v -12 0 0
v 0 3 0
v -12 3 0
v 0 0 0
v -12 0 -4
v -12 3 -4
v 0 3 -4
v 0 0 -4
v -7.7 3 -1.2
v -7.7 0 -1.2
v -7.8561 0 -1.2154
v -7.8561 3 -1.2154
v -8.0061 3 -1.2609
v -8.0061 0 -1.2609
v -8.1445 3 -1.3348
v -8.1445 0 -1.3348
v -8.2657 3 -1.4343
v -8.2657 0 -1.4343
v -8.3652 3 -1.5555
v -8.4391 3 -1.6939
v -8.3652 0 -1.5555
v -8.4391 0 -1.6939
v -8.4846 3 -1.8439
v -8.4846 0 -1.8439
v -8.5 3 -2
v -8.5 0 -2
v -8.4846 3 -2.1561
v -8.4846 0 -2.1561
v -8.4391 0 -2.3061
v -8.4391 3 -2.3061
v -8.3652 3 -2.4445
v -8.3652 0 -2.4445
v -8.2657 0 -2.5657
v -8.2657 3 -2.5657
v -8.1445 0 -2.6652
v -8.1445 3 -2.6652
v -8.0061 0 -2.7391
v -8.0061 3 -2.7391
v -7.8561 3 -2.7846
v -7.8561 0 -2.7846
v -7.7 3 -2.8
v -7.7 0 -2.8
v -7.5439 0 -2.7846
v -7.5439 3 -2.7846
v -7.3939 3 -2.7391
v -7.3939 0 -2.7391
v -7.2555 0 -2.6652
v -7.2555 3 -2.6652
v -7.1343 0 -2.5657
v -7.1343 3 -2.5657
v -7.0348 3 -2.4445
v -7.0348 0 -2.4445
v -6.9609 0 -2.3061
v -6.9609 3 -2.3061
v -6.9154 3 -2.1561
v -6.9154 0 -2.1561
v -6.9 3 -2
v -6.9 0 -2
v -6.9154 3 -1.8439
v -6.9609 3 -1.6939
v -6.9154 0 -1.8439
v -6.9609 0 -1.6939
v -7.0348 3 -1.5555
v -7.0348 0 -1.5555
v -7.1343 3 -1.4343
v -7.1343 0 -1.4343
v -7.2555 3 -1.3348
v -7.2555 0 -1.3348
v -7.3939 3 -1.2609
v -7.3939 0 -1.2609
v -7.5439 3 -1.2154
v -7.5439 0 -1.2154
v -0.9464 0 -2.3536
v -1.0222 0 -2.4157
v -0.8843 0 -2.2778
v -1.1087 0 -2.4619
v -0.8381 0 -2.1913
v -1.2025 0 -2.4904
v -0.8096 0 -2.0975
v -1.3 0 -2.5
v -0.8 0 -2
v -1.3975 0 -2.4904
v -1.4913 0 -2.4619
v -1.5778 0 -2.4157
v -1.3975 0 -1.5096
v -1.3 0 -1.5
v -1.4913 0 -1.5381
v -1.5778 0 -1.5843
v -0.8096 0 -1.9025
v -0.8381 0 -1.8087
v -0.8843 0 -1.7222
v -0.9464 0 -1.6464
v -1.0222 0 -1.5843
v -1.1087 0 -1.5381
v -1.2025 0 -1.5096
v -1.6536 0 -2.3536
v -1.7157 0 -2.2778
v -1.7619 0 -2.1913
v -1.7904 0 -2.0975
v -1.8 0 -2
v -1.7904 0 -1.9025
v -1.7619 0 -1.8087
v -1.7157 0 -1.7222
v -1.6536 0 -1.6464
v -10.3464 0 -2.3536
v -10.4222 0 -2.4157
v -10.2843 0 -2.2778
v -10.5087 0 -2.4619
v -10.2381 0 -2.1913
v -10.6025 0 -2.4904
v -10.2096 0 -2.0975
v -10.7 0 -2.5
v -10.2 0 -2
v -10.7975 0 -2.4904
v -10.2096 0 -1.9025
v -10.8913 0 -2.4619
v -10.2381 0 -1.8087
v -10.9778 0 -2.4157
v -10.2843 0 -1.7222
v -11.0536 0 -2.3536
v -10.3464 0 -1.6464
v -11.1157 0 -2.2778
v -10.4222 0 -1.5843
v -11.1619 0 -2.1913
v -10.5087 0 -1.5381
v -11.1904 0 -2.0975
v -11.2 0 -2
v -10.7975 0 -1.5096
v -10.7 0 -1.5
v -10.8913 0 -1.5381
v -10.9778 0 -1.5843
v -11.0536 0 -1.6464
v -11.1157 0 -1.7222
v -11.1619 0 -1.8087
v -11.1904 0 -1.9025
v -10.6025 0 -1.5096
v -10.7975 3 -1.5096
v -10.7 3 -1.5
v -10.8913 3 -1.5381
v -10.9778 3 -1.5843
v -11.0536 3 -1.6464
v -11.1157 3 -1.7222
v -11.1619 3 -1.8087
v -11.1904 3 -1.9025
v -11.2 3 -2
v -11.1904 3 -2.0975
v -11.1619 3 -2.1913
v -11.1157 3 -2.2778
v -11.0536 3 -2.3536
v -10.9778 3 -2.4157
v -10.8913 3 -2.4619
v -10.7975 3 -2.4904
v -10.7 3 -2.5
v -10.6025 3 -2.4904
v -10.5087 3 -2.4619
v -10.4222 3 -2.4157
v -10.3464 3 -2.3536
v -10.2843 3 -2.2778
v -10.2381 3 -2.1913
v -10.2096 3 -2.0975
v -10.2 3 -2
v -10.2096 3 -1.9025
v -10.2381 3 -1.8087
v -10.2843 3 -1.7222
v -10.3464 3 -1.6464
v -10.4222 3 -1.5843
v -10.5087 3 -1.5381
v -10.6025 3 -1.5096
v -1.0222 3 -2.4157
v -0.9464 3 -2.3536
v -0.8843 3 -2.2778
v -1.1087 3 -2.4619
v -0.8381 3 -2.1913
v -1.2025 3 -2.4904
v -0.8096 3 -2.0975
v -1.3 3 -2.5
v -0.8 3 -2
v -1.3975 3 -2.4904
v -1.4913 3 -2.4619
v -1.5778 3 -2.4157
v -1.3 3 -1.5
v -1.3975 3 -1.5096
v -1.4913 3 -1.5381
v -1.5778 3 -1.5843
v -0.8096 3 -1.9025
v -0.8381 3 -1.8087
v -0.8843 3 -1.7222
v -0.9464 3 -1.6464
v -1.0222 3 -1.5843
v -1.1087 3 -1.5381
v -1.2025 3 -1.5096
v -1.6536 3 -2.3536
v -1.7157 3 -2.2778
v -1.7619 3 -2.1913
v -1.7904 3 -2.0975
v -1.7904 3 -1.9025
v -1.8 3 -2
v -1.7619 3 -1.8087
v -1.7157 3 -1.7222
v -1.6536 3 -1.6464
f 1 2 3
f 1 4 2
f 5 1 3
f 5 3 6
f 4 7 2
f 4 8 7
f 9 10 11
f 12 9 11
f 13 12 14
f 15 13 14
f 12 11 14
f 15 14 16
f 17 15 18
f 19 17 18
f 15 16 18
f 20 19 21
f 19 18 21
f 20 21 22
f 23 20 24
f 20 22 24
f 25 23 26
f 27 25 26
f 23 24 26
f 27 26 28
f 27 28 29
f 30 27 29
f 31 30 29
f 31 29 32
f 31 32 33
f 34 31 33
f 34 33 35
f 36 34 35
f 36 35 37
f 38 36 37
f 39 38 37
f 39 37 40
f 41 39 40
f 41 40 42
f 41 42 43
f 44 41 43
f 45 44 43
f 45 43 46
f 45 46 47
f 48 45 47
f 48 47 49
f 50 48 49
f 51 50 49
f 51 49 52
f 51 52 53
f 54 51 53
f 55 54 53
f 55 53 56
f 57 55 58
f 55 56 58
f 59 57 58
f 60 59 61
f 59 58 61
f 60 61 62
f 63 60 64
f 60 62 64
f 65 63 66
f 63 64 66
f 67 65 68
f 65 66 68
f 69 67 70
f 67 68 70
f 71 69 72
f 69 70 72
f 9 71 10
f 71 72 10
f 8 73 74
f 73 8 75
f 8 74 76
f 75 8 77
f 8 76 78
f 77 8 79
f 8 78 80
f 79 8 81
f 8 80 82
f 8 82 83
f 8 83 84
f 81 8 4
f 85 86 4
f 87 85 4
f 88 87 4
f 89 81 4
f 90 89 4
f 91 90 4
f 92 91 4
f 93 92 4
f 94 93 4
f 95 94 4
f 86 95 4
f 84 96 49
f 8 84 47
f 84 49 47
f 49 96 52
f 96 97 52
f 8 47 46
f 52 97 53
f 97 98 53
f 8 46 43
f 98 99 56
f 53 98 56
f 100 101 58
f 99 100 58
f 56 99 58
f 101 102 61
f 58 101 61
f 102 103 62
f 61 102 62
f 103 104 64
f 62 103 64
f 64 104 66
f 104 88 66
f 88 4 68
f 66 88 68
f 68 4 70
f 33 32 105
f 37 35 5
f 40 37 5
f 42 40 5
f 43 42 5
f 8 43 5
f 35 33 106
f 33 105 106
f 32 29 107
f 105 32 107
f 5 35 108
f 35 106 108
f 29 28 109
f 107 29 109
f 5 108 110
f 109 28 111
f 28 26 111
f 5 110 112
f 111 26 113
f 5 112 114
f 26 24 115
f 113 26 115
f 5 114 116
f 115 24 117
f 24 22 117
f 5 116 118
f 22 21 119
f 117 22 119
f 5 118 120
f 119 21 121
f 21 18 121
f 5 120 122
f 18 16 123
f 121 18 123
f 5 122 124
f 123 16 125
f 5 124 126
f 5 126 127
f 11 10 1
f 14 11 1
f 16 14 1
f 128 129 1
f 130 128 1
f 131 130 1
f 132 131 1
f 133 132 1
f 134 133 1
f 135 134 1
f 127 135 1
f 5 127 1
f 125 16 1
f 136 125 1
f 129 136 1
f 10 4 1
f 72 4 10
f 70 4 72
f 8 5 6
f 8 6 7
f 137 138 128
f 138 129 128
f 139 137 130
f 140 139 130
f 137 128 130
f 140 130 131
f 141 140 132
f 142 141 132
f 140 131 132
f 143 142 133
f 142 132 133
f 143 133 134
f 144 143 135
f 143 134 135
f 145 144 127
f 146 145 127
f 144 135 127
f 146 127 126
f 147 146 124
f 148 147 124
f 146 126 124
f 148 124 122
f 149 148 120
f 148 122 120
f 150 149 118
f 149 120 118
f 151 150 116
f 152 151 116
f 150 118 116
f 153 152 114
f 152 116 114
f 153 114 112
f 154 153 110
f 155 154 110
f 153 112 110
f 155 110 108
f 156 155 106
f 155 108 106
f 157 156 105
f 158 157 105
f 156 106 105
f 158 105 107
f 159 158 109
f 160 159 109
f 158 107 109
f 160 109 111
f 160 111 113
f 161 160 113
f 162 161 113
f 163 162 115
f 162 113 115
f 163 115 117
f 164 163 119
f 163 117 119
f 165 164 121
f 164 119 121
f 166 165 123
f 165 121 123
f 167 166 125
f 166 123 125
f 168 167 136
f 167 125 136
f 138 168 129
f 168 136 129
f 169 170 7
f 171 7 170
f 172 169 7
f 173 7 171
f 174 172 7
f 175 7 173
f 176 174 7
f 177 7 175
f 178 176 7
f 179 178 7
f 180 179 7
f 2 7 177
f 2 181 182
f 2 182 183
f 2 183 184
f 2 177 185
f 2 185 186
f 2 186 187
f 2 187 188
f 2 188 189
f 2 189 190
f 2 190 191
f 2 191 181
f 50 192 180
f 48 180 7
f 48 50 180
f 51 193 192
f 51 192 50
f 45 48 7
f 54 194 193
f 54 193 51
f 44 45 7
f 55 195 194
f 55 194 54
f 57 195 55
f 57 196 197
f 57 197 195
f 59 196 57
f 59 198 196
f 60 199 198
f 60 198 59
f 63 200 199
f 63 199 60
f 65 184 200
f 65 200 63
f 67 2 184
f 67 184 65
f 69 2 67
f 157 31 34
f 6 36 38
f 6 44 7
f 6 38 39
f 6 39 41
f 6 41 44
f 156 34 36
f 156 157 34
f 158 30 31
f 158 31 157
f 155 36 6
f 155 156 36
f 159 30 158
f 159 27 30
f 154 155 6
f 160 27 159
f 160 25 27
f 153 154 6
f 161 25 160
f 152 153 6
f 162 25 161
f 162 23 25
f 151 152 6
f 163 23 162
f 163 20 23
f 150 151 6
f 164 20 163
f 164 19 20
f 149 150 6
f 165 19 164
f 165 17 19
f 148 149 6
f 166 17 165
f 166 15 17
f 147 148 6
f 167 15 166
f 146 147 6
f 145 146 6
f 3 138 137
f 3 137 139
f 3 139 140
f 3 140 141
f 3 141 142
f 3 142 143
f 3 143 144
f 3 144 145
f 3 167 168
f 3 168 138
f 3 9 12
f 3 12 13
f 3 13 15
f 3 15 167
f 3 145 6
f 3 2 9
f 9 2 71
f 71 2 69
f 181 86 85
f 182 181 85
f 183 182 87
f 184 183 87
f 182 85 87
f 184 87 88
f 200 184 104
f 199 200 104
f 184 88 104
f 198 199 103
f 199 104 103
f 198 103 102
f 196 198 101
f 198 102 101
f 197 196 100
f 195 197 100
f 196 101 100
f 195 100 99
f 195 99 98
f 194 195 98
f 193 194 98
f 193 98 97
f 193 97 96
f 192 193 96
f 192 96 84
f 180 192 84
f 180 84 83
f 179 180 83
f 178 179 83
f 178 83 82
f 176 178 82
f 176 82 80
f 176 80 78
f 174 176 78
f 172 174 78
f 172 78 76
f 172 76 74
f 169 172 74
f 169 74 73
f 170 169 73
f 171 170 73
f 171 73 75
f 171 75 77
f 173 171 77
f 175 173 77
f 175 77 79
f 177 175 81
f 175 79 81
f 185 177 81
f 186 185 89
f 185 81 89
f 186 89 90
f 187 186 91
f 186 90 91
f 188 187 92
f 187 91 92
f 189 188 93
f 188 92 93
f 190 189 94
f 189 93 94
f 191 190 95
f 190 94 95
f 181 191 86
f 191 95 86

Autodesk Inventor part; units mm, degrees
ref_plane "YZ Plane" through (0, 0, 0) normal (1, 0, 0) x (0, 1, 0)
ref_plane "XZ Plane" through (0, 0, 0) normal (0, 1, 0) x (-1, 0, 0)
ref_plane "XY Plane" through (0, 0, 0) normal (0, 0, 1) x (1, 0, 0)
sketch "스케치1" plane through (0, 0, 0) normal (0, 1, 0) x (-1, 0, 0)
  line L0 (0, 0) -> (12, 0)
  line L1 (12, 0) -> (12, -4)
  line L2 (12, -4) -> (0, -4)
  line L3 (0, -4) -> (0, 0)
  dimension "d0" = 12
  dimension "d1" = 4
extrude "돌출1" add sketch "스케치1" along normal blind 3
sketch "스케치2" plane through (0, 3, 0) normal (0, 1, 0) x (1, 0, 0)
  line L0 (0, 0) -> (0, 4) construction
  line L1 (0, 2) -> (-12, 2) construction
  line L2 (-12, 4) -> (-12, 0) construction
  point P0 (-1.3, 2)
  point P1 (-7.7, 2)
  point P2 (-10.7, 2)
  dimension "d59" = 1.3
  dimension "d60" = 3
  dimension "d62" = 1.3
hole "구멍1" at (-10.7, 3, -2) at (-1.3, 3, -2) direction (0, -1, 0) diameter 1 end through all
hole "구멍2" at (-7.7, 3, -2) direction (0, -1, 0) diameter 1.6 end through all
equation "\"G23_F\" = 0.65"
equation "\"G23_M\" = 0.67"
equation "\"Screw_F\" = 1.3"
equation "\"Screw_M\" = 1.6"
properties part number "_3D 인쇄"
